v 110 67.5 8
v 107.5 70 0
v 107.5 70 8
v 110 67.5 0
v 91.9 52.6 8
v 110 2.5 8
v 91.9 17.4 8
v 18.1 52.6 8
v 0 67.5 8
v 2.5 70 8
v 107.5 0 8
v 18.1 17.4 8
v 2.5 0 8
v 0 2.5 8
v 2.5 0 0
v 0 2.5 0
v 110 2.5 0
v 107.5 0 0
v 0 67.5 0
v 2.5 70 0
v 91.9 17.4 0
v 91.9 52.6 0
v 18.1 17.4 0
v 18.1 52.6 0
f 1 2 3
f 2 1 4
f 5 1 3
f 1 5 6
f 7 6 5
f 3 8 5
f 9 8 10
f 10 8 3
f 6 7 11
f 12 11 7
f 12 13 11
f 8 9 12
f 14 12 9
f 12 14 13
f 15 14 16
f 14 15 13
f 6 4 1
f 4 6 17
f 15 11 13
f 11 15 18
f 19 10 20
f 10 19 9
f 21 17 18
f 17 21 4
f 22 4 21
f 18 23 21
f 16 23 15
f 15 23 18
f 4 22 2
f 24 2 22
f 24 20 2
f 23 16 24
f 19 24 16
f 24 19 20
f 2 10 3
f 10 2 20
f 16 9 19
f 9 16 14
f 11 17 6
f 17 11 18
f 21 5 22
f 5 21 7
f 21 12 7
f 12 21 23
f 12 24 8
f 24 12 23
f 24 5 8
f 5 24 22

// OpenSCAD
$fn = 32;

// ----------------------------------------------------------------------
// Windowed plate: 1 voids, 110 x 70 x 8 mm
// ----------------------------------------------------------------------

// --- parameters (mm) ---
plate_l = 110;            // plate length, X
plate_w = 70;             // plate width, Y
plate_t = 8;              // plate thickness, Z
edge_margin = 12;         // wall from the plate edge to any window
win1_l = 73.8;            // window length
win1_w = 35.2;            // window width
depth_1 = 8;              // depth of void 1 (full thickness = through)
corner_c = 2.5;           // corner chamfer of the plate

profile = [[2.5, 0], [107.5, 0], [110, 2.5], [110, 67.5], [107.5, 70], [2.5, 70], [0, 67.5], [0, 2.5]];  // primary outline, 8 points, counter clockwise
void_1 = [[18.1, 17.4], [91.9, 17.4], [91.9, 52.6], [18.1, 52.6]];  // large central window, 4 points

// --- the one profile operation ---
difference() {
  linear_extrude(height = plate_t) polygon(points = profile);
  translate([0, 0, -1])
    linear_extrude(height = plate_t + 2) polygon(points = void_1);
}
